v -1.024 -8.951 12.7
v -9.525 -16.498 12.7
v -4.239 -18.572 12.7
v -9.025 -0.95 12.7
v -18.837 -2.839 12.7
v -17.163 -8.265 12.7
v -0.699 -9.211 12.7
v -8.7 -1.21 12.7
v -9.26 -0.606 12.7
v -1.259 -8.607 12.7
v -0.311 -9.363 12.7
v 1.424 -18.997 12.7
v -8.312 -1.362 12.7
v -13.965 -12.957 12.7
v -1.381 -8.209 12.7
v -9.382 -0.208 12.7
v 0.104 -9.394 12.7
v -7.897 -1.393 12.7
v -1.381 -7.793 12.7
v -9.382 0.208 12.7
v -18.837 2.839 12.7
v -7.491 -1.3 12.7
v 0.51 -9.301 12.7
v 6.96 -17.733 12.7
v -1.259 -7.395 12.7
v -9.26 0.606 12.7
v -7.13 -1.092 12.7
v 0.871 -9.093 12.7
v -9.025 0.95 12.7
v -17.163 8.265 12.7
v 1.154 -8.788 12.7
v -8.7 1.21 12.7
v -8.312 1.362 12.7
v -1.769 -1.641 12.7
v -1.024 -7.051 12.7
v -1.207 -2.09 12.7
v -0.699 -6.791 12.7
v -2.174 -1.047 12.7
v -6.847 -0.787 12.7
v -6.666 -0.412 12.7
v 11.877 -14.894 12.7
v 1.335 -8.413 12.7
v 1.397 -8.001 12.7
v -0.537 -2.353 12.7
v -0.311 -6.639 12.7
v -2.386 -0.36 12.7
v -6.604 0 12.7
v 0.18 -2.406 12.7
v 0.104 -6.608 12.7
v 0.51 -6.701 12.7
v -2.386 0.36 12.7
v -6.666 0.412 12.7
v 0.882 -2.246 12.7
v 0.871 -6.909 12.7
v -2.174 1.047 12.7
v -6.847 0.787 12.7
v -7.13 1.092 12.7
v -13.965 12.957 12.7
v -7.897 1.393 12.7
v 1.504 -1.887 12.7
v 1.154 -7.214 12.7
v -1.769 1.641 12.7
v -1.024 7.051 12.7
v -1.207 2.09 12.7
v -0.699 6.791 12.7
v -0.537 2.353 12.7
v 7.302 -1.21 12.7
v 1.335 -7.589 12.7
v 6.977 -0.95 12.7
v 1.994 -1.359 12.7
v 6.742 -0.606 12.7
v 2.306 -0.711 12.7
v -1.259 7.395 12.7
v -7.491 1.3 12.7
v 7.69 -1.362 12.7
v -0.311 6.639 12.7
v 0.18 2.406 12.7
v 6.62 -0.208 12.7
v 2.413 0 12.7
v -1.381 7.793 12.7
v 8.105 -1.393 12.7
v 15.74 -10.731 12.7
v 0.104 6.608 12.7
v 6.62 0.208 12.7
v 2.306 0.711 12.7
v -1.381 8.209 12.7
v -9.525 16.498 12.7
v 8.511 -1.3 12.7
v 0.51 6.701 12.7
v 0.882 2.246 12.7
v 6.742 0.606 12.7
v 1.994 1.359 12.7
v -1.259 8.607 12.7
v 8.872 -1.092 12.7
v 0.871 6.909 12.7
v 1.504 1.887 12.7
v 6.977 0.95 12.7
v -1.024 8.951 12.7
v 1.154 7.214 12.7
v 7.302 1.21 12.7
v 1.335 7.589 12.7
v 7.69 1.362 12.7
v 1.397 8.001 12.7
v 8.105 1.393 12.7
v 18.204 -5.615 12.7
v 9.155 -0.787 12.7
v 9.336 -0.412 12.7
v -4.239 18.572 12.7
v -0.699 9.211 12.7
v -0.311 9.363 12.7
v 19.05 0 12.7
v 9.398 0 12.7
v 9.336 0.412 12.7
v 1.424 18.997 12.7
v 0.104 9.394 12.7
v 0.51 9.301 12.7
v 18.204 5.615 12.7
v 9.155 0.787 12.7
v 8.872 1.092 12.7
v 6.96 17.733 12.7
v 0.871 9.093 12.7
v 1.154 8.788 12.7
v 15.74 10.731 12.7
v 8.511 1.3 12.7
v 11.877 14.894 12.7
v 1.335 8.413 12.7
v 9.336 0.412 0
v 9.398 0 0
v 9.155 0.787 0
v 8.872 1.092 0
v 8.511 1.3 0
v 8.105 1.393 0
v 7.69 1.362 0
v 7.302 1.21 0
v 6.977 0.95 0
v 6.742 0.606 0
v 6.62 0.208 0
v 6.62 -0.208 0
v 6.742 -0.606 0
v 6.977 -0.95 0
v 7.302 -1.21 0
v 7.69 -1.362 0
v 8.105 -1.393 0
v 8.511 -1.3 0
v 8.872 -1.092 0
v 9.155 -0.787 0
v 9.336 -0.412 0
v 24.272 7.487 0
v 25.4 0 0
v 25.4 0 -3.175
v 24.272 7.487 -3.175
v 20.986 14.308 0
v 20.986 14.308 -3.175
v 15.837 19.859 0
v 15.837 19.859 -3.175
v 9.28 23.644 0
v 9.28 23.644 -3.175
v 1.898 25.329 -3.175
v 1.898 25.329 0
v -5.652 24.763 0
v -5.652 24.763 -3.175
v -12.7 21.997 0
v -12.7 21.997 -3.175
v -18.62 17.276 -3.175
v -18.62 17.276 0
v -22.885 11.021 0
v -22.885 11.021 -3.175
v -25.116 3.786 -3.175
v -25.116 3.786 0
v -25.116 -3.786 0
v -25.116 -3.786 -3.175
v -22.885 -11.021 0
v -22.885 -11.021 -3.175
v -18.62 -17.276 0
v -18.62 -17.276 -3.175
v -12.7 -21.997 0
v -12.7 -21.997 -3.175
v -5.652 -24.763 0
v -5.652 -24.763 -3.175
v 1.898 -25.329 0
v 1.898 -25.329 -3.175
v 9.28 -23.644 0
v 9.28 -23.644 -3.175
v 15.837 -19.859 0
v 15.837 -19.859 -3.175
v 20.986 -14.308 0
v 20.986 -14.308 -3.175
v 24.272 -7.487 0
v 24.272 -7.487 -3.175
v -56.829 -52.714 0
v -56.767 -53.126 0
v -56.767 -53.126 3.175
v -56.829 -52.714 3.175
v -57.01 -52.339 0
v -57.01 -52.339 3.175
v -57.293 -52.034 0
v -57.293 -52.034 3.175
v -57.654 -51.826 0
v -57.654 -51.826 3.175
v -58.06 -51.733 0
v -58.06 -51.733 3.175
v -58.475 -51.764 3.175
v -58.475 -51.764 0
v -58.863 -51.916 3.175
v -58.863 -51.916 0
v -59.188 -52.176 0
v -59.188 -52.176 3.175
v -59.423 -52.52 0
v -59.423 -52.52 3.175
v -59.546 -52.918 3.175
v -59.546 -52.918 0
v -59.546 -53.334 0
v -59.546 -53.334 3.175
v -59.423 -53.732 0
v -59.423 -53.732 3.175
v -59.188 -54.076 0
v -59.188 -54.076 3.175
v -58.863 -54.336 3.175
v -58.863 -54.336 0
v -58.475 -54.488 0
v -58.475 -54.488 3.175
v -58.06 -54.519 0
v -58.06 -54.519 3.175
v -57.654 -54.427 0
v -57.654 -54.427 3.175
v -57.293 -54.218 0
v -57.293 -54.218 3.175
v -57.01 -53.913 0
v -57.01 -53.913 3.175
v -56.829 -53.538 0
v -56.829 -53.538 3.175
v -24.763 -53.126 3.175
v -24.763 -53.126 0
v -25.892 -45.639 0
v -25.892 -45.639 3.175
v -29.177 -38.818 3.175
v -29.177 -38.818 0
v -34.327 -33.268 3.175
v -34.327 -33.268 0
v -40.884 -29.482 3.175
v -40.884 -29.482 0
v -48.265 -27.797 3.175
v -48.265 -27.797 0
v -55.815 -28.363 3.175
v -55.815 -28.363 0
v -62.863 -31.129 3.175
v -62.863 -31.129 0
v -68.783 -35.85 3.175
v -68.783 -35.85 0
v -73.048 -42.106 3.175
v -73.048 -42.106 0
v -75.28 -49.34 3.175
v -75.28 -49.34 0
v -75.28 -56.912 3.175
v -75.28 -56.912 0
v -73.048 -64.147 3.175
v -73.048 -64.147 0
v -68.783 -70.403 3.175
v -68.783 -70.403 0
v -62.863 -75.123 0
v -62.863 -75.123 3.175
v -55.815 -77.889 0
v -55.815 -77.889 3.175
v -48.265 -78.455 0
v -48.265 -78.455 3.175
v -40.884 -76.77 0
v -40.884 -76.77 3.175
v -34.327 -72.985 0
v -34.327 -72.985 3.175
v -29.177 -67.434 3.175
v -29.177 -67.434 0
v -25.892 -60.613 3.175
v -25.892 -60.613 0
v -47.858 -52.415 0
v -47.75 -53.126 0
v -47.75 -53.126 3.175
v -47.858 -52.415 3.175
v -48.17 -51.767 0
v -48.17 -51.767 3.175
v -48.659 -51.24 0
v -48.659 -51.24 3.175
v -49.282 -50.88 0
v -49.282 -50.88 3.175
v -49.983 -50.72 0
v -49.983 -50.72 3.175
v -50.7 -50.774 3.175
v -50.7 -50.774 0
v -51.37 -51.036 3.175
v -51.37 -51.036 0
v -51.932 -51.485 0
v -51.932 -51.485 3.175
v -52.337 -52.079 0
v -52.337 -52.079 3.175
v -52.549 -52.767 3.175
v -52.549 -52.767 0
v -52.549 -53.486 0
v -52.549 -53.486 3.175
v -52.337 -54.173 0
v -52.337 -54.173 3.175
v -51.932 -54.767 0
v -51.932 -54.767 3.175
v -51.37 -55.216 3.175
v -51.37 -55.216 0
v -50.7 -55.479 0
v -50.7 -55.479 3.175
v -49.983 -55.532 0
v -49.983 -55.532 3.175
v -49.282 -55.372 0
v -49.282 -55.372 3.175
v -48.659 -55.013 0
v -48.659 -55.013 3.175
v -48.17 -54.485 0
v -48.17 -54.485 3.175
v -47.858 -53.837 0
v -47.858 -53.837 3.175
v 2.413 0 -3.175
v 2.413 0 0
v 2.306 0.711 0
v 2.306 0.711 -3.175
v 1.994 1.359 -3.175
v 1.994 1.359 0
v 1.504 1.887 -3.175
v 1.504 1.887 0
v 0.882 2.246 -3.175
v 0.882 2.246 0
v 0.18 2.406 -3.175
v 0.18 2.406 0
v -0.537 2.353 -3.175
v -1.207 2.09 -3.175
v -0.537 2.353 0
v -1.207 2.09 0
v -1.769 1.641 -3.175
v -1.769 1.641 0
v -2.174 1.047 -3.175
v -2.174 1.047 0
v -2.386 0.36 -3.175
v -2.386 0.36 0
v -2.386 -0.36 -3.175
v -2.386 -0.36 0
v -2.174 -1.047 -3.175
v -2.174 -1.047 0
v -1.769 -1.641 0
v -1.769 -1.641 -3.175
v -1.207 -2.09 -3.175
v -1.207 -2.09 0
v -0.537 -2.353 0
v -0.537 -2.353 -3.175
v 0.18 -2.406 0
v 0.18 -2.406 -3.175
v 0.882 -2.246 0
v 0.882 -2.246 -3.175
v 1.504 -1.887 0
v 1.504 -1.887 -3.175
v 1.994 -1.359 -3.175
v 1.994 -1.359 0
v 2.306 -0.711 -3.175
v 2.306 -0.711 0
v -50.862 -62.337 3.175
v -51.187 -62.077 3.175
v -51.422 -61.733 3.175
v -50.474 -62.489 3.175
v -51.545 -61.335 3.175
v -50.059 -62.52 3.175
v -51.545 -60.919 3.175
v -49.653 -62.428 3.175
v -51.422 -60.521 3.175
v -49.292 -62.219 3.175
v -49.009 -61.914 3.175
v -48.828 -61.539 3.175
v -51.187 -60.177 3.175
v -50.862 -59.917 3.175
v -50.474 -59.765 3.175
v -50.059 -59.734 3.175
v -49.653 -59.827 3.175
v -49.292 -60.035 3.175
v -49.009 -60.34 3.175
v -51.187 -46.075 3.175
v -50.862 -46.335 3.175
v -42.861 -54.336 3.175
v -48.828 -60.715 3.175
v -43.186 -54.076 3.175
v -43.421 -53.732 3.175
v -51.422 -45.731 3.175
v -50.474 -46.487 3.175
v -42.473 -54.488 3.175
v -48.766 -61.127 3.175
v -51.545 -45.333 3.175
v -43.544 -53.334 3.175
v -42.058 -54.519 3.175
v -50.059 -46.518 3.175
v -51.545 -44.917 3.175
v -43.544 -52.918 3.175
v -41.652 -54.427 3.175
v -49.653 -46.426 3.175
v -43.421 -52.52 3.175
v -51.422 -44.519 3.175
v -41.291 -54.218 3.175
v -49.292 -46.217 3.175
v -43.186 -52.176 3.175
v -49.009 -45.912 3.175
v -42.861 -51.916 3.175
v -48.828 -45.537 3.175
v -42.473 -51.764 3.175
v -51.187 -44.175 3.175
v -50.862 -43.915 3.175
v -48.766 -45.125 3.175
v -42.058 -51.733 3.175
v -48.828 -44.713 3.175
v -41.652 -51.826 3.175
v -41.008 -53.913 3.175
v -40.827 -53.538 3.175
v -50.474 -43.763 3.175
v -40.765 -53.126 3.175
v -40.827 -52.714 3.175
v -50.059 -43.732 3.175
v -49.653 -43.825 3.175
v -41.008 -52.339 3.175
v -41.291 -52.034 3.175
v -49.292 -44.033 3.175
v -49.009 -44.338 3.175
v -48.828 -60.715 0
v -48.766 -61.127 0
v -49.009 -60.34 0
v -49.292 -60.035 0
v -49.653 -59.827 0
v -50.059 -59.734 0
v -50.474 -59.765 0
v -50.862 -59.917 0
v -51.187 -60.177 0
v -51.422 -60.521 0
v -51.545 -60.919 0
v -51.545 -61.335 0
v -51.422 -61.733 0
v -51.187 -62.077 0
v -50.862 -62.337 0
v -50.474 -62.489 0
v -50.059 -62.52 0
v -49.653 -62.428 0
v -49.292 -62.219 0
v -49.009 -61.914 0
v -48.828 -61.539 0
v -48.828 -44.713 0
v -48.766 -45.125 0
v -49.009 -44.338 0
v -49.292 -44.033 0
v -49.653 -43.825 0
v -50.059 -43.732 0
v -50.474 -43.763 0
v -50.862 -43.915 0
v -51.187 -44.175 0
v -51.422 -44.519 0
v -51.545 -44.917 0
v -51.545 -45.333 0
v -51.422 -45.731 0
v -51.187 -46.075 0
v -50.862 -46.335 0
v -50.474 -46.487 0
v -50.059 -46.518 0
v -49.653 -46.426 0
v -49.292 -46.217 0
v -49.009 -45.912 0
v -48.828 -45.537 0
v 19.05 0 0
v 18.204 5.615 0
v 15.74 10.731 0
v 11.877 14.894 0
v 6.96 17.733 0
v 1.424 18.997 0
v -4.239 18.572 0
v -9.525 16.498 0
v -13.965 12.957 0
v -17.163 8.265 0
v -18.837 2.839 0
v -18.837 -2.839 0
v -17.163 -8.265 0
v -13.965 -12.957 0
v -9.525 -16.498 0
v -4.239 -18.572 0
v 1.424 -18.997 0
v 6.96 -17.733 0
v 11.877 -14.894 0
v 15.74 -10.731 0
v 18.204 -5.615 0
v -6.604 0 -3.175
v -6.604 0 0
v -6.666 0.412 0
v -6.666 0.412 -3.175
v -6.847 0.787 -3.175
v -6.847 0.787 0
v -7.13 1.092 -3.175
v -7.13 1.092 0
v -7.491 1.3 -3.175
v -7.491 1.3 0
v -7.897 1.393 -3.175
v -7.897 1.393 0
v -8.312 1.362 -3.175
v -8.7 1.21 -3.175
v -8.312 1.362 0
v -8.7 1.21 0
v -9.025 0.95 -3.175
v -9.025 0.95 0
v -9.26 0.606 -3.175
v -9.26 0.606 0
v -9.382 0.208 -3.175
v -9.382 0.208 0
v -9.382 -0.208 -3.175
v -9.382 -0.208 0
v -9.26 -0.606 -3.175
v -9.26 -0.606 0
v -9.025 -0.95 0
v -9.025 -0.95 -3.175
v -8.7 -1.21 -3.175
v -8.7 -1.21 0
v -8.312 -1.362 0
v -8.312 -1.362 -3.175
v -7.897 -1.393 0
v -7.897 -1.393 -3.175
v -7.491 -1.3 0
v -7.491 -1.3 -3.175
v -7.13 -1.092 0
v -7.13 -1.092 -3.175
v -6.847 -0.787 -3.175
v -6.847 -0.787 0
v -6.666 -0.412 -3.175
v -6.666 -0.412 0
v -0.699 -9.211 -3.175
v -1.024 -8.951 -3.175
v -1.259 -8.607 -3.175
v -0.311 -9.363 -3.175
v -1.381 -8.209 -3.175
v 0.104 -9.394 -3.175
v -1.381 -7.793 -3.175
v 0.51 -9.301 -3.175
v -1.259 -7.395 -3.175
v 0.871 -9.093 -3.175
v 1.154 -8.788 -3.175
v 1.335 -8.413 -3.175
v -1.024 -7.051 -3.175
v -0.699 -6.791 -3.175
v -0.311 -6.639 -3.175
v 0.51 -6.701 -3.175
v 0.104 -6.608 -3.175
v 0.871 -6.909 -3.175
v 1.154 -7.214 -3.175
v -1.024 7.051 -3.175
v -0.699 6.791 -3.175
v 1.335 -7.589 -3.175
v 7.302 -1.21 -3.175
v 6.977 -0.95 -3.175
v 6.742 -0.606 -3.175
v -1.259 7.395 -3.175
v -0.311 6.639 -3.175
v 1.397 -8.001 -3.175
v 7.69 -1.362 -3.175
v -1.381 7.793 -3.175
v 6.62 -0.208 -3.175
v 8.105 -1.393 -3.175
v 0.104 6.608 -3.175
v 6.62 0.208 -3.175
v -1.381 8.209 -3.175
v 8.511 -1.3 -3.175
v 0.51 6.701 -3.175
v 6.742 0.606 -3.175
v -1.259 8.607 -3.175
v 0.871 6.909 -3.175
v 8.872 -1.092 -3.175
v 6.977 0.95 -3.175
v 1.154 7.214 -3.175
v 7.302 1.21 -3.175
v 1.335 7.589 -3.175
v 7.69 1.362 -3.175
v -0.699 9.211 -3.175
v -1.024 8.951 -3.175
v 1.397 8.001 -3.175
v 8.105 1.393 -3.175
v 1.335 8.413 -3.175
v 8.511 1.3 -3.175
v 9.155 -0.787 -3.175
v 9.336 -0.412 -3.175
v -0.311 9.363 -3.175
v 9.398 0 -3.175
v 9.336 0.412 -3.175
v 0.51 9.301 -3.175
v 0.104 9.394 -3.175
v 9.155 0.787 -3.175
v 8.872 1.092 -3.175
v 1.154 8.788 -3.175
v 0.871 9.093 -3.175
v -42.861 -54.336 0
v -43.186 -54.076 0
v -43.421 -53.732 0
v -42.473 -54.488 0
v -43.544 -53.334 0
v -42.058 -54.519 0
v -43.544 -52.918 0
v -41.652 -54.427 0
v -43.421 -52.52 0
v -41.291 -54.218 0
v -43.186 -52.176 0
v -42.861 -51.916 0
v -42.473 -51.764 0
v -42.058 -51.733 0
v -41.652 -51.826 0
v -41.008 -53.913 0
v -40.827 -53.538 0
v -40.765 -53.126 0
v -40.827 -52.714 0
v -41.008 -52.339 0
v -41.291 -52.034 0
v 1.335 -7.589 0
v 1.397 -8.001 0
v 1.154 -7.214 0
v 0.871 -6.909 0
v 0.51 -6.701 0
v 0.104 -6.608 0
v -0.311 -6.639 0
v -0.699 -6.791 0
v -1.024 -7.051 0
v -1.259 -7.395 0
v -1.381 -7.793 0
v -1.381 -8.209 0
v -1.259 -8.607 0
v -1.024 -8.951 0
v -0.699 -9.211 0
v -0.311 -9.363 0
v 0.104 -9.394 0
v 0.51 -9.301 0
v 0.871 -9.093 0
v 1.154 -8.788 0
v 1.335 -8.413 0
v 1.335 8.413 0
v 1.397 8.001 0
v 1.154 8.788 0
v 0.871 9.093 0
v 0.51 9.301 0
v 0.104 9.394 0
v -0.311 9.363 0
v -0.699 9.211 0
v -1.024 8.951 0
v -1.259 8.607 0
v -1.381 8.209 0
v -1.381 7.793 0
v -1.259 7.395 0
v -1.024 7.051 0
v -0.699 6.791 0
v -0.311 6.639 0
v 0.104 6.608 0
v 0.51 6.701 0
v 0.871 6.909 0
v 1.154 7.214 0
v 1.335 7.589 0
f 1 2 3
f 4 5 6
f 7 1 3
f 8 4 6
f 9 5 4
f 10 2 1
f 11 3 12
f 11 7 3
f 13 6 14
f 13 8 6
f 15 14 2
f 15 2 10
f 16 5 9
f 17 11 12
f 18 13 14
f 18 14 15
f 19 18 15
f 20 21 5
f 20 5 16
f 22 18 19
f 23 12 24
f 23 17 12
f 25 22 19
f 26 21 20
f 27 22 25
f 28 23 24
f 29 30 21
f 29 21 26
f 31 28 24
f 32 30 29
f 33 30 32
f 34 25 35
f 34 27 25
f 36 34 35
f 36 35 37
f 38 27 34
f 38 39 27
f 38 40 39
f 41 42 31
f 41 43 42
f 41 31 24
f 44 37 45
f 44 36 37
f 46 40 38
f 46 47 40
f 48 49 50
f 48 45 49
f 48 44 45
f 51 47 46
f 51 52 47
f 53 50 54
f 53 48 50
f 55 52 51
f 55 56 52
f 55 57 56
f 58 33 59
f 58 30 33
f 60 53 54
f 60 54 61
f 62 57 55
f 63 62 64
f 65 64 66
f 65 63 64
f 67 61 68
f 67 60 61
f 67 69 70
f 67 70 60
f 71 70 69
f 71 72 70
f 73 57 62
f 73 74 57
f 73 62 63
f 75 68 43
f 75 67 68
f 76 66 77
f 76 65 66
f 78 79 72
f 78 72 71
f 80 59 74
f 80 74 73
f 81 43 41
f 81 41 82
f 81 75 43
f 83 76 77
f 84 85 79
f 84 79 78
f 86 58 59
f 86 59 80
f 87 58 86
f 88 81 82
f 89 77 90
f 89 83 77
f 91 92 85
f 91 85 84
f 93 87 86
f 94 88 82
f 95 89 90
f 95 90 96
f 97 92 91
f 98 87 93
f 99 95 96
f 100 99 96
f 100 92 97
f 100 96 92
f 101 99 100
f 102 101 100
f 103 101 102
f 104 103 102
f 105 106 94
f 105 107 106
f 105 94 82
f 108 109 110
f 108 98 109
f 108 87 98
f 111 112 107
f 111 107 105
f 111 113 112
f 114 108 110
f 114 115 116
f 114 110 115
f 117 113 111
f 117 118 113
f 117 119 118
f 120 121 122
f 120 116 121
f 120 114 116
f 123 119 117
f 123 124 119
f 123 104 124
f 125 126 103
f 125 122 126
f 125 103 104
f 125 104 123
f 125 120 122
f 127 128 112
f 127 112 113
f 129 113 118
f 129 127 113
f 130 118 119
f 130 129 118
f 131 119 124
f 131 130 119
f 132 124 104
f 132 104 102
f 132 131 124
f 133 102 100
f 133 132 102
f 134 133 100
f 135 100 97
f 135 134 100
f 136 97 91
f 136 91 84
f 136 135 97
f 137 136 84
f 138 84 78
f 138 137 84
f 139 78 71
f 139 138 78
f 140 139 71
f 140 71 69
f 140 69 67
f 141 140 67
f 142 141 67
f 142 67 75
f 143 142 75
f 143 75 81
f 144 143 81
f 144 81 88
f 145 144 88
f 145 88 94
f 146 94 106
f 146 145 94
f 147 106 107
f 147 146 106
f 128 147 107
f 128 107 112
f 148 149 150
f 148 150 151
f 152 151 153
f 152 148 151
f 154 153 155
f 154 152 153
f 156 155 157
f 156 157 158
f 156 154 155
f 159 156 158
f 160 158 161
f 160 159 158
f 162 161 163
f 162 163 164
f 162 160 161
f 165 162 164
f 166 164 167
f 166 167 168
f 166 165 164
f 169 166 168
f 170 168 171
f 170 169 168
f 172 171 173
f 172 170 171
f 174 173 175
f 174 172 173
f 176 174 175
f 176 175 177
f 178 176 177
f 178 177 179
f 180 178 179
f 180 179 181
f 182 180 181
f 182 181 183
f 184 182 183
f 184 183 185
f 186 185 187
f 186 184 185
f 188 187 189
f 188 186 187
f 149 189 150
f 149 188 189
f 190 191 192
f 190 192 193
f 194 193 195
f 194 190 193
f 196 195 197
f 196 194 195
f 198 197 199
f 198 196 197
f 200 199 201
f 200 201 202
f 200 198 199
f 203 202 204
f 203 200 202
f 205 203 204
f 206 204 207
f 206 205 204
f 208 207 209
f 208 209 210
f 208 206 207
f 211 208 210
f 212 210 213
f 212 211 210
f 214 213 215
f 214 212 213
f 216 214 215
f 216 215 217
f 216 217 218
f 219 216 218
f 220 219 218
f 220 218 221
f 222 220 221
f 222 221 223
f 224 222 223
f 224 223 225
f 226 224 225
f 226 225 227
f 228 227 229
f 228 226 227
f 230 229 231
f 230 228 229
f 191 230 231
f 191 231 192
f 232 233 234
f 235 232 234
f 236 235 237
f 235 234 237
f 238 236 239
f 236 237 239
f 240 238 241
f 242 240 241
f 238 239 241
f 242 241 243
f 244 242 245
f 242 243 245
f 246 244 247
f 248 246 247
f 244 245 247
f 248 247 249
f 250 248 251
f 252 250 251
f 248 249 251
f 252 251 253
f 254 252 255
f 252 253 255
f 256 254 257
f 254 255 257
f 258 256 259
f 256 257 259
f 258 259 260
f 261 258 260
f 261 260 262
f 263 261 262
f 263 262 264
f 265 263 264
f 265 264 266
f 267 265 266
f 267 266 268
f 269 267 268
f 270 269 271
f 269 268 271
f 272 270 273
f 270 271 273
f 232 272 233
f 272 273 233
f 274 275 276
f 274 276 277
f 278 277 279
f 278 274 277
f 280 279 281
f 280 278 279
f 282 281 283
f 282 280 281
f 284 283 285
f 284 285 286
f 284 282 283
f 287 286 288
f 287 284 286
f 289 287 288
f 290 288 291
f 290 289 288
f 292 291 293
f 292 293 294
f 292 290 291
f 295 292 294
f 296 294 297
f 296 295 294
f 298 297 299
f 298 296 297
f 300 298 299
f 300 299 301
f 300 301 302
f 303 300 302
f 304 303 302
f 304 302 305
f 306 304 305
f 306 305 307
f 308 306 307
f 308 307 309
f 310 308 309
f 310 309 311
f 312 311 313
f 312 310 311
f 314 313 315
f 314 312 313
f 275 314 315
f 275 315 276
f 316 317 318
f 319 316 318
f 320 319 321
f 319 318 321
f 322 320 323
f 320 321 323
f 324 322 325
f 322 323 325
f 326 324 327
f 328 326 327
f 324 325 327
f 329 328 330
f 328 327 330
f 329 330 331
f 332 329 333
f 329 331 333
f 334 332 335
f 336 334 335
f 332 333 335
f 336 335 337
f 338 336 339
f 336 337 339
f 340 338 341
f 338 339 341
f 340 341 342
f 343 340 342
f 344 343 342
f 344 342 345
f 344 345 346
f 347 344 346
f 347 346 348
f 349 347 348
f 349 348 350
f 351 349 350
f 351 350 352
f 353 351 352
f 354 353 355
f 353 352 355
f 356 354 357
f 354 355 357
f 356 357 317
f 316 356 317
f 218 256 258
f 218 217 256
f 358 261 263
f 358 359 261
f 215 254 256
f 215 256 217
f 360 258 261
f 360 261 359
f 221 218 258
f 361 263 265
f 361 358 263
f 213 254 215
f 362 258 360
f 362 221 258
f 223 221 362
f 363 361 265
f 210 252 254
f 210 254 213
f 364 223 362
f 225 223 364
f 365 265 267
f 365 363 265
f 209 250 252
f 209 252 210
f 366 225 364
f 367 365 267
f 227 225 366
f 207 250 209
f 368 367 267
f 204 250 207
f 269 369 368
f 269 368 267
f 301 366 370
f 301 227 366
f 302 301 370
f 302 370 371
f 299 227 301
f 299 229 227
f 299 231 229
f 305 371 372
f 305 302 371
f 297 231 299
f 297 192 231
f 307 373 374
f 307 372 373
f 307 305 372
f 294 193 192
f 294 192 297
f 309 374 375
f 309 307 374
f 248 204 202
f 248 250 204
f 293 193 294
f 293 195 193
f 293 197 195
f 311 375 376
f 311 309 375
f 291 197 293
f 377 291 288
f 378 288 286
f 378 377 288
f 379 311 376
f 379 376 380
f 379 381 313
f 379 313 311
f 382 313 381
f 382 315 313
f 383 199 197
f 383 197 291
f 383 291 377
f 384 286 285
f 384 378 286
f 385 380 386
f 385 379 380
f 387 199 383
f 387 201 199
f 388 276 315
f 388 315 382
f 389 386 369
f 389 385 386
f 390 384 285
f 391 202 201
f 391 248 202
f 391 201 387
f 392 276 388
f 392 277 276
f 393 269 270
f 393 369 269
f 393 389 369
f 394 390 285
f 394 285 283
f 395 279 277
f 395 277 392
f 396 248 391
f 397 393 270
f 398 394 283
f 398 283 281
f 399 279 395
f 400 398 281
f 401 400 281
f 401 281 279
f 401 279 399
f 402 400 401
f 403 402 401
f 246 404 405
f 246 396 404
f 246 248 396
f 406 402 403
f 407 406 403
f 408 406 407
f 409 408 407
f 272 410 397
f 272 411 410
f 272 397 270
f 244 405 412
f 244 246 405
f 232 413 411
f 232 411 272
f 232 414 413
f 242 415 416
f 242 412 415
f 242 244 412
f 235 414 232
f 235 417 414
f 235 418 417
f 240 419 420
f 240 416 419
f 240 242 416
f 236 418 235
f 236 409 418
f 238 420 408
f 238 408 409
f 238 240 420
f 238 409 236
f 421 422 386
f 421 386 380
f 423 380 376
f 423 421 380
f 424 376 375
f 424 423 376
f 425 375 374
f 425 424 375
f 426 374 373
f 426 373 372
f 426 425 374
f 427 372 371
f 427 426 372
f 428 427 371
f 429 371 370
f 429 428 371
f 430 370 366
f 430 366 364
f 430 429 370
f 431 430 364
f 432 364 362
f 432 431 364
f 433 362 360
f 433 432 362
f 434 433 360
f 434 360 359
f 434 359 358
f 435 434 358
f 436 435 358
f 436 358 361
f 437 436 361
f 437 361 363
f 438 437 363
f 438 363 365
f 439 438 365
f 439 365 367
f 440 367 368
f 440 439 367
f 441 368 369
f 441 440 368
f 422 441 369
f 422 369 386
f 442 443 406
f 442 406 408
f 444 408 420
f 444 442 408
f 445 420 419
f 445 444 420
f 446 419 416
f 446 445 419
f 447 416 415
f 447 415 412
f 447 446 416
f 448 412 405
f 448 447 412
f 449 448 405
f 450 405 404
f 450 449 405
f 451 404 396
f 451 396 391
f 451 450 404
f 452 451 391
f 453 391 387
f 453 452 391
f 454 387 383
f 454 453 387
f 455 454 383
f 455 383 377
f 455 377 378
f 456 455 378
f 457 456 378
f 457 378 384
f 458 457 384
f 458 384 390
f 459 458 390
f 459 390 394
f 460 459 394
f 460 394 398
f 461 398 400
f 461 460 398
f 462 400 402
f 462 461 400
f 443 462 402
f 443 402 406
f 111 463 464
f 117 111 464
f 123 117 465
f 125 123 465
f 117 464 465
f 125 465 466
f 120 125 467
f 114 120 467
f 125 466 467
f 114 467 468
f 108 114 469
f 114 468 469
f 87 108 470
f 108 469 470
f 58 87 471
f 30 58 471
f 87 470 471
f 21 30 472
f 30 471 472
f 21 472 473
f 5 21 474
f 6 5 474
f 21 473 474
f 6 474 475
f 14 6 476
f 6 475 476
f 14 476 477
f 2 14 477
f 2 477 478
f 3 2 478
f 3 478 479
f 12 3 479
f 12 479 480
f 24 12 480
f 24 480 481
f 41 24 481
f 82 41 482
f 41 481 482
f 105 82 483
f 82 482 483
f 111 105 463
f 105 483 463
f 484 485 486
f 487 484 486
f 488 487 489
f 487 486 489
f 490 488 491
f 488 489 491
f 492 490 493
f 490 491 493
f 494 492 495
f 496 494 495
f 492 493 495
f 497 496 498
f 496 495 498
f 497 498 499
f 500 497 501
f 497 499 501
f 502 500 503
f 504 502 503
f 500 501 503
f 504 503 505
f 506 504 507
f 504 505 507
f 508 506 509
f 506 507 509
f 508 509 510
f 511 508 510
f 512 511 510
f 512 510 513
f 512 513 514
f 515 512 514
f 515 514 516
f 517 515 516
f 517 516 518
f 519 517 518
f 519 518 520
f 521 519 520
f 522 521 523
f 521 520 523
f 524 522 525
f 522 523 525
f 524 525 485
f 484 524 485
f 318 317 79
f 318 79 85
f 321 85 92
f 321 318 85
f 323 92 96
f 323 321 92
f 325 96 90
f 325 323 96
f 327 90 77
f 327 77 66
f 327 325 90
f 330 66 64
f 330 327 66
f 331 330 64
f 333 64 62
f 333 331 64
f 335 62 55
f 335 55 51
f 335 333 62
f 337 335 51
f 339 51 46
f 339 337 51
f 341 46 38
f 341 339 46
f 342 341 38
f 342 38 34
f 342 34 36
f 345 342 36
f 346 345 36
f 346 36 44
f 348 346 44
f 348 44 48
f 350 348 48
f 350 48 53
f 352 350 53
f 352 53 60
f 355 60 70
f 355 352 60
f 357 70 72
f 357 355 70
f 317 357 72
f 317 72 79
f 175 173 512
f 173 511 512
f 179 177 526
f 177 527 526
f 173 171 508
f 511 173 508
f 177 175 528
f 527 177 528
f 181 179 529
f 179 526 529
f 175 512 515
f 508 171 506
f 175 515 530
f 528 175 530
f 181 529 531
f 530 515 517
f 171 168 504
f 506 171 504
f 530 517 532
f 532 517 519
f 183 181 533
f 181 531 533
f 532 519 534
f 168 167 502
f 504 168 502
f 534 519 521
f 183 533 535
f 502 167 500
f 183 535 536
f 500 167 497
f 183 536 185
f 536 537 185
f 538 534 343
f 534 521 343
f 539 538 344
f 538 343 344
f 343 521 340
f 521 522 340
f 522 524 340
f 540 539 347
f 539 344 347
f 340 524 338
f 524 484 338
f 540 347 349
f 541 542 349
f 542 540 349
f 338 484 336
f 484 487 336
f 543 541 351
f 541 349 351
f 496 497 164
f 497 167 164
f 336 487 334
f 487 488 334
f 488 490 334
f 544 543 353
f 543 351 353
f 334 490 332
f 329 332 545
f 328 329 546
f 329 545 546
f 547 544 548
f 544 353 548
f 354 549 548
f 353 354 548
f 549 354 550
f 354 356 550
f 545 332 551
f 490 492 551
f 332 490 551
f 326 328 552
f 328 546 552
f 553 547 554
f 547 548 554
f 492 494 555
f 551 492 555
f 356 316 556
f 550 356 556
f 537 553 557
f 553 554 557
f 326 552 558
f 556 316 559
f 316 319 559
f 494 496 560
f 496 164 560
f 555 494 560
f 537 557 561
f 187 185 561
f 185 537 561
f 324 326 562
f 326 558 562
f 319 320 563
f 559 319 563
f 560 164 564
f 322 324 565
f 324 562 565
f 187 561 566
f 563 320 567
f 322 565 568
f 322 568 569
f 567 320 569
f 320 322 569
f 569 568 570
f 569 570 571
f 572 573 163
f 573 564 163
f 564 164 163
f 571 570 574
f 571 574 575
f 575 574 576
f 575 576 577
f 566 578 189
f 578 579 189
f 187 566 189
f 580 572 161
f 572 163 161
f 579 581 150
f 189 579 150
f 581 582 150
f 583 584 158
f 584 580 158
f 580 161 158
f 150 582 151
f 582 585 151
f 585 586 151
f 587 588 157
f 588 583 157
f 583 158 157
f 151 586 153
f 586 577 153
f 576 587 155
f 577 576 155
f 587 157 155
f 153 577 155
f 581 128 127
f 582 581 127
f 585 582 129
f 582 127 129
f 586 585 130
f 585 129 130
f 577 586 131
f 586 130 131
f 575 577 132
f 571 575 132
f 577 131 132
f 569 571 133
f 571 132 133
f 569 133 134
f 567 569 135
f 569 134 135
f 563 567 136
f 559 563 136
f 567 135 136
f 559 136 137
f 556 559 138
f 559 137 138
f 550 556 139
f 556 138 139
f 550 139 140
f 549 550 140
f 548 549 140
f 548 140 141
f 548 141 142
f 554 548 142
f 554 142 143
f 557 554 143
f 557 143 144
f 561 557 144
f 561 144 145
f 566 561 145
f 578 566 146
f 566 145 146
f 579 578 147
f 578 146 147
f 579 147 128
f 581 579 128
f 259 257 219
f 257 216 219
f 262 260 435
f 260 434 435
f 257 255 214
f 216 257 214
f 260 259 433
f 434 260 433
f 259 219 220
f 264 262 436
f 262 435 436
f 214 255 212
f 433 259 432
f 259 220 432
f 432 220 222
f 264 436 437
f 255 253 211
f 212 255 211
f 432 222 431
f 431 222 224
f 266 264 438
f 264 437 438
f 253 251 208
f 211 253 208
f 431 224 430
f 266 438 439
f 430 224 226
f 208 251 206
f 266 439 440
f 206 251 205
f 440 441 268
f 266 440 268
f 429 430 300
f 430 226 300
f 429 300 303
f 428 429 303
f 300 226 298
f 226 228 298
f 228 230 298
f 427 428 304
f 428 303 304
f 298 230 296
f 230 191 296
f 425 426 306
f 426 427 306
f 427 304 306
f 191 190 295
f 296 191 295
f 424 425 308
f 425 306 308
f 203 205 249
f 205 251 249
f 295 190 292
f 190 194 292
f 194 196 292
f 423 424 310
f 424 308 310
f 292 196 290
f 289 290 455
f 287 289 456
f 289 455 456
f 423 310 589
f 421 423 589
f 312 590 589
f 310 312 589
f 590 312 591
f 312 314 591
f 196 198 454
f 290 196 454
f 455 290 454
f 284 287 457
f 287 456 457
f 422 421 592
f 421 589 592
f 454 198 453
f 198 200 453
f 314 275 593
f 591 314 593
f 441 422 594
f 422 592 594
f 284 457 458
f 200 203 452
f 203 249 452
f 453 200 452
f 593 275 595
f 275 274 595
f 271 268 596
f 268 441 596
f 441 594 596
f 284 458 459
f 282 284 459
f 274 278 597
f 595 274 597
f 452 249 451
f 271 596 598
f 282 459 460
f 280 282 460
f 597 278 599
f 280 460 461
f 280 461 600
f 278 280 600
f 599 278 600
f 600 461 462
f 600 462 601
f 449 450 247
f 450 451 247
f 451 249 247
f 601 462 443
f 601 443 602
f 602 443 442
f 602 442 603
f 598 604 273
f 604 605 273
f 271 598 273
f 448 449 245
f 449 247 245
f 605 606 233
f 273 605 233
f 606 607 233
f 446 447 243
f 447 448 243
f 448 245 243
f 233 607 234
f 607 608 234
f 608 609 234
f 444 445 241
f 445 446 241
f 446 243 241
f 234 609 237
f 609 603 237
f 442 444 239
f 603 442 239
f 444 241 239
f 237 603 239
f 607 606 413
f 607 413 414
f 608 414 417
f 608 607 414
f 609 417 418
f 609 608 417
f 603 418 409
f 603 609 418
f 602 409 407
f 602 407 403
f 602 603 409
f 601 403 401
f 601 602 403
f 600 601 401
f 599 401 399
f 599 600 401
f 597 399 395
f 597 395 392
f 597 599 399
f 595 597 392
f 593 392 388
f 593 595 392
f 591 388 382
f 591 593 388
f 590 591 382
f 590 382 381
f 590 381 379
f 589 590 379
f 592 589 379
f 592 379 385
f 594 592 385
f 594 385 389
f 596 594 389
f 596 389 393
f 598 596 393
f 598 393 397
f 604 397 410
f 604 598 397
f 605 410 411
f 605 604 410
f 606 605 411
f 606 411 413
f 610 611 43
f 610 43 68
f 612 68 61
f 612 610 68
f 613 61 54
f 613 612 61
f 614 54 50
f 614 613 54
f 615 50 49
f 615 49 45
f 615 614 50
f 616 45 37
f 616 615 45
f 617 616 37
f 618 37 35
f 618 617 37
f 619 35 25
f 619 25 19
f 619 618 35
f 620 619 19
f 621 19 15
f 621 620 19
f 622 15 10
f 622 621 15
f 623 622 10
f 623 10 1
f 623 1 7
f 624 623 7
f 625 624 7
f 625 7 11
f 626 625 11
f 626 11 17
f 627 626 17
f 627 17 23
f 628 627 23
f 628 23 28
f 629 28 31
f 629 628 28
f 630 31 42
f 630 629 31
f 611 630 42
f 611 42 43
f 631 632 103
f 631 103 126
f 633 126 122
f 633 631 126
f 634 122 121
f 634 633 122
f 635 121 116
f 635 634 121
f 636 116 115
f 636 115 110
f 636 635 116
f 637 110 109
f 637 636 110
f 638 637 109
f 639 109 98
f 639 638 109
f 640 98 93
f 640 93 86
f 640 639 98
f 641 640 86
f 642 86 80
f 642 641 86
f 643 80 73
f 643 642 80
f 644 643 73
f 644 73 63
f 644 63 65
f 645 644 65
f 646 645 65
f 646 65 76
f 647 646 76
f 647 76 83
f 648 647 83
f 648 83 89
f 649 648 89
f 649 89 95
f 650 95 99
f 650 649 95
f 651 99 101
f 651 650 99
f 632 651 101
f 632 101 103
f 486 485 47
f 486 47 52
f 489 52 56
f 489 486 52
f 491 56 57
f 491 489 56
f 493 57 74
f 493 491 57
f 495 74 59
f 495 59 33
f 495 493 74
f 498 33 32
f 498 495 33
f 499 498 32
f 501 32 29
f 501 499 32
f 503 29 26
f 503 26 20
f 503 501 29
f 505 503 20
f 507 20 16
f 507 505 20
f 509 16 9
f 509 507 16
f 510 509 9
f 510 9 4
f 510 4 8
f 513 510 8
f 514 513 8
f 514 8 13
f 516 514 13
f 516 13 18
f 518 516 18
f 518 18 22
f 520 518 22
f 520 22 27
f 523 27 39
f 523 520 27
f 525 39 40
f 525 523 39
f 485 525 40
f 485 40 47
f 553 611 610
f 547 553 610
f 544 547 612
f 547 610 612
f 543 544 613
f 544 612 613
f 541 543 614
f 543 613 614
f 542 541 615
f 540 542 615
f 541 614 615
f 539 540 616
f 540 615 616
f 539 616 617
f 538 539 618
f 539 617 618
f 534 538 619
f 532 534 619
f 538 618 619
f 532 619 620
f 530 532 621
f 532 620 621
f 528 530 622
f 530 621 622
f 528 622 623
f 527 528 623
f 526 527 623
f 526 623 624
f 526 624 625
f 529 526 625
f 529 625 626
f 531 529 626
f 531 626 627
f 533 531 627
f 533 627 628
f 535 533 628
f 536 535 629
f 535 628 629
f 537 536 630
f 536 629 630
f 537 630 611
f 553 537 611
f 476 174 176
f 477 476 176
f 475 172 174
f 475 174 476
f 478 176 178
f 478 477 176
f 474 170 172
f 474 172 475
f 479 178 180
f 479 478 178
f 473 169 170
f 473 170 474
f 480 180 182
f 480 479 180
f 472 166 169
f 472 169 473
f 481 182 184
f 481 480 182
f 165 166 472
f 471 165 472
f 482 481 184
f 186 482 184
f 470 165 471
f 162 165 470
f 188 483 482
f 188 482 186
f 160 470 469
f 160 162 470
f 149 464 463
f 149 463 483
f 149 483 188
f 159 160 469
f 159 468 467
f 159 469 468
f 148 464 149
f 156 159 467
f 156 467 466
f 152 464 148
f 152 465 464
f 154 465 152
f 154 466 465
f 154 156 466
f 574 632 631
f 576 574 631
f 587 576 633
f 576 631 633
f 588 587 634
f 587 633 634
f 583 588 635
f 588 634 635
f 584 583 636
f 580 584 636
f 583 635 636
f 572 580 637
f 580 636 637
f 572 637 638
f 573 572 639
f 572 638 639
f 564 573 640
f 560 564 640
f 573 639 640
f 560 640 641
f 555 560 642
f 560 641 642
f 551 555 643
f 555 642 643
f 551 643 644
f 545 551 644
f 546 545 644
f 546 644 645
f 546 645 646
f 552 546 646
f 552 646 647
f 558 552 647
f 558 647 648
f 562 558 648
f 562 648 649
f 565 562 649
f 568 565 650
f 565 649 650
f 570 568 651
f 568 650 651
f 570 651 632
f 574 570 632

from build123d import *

# Parameters (mm, degrees)
F0_R     = 19.05
F0_R_2   = 1.397
F0_R_3   = 2.413
F1_DEPTH = 12.7
F0_R_4   = 25.4
F2_DEPTH = 3.175
F3_R     = 25.4
F3_R_2   = 19.05
F3_R_3   = 1.397
F3_R_4   = 2.413
F4_DEPTH = 3.175


with BuildPart() as f1:
    # F0 (on Top) → F1 (new body)
    with BuildSketch(Plane.XY):
        Circle(F0_R)
        with Locations((0, -8.001)):
            Circle(F0_R_2, mode=Mode.SUBTRACT)
        with Locations((-8.001, 0)):
            Circle(F0_R_2, mode=Mode.SUBTRACT)
        Circle(F0_R_3, mode=Mode.SUBTRACT)
        with Locations((8.001, 0)):
            Circle(F0_R_2, mode=Mode.SUBTRACT)
        with Locations((0, 8.001)):
            Circle(F0_R_2, mode=Mode.SUBTRACT)
    extrude(amount=F1_DEPTH)

    # F0 (on Top) → F2 (join)
    with BuildSketch(Plane.XY):
        Circle(F0_R_4)
        Circle(F0_R, mode=Mode.SUBTRACT)
        Circle(F0_R)
        with Locations((0, -8.001)):
            Circle(F0_R_2, mode=Mode.SUBTRACT)
        with Locations((-8.001, 0)):
            Circle(F0_R_2, mode=Mode.SUBTRACT)
        Circle(F0_R_3, mode=Mode.SUBTRACT)
        with Locations((8.001, 0)):
            Circle(F0_R_2, mode=Mode.SUBTRACT)
        with Locations((0, 8.001)):
            Circle(F0_R_2, mode=Mode.SUBTRACT)
    extrude(amount=-F2_DEPTH)


with BuildPart() as f4:
    # F3 (on Top) → F4 (new body)
    with BuildSketch(Plane.XY):
        with Locations((-50.1633882523, -53.126167506)):
            Circle(F3_R)
        with Locations((-50.1633882523, -53.126167506)):
            Circle(F3_R_2, mode=Mode.SUBTRACT)
        with Locations((-50.1633882523, -53.126167506)):
            Circle(F3_R_2)
        with Locations((-50.1633882523, -61.127167506)):
            Circle(F3_R_3, mode=Mode.SUBTRACT)
        with Locations((-58.1643882523, -53.126167506)):
            Circle(F3_R_3, mode=Mode.SUBTRACT)
        with Locations((-50.1633882523, -53.126167506)):
            Circle(F3_R_4, mode=Mode.SUBTRACT)
        with Locations((-42.1623882523, -53.126167506)):
            Circle(F3_R_3, mode=Mode.SUBTRACT)
        with Locations((-50.1633882523, -45.125167506)):
            Circle(F3_R_3, mode=Mode.SUBTRACT)
    extrude(amount=F4_DEPTH)


solid = Compound([f1.part, f4.part])
